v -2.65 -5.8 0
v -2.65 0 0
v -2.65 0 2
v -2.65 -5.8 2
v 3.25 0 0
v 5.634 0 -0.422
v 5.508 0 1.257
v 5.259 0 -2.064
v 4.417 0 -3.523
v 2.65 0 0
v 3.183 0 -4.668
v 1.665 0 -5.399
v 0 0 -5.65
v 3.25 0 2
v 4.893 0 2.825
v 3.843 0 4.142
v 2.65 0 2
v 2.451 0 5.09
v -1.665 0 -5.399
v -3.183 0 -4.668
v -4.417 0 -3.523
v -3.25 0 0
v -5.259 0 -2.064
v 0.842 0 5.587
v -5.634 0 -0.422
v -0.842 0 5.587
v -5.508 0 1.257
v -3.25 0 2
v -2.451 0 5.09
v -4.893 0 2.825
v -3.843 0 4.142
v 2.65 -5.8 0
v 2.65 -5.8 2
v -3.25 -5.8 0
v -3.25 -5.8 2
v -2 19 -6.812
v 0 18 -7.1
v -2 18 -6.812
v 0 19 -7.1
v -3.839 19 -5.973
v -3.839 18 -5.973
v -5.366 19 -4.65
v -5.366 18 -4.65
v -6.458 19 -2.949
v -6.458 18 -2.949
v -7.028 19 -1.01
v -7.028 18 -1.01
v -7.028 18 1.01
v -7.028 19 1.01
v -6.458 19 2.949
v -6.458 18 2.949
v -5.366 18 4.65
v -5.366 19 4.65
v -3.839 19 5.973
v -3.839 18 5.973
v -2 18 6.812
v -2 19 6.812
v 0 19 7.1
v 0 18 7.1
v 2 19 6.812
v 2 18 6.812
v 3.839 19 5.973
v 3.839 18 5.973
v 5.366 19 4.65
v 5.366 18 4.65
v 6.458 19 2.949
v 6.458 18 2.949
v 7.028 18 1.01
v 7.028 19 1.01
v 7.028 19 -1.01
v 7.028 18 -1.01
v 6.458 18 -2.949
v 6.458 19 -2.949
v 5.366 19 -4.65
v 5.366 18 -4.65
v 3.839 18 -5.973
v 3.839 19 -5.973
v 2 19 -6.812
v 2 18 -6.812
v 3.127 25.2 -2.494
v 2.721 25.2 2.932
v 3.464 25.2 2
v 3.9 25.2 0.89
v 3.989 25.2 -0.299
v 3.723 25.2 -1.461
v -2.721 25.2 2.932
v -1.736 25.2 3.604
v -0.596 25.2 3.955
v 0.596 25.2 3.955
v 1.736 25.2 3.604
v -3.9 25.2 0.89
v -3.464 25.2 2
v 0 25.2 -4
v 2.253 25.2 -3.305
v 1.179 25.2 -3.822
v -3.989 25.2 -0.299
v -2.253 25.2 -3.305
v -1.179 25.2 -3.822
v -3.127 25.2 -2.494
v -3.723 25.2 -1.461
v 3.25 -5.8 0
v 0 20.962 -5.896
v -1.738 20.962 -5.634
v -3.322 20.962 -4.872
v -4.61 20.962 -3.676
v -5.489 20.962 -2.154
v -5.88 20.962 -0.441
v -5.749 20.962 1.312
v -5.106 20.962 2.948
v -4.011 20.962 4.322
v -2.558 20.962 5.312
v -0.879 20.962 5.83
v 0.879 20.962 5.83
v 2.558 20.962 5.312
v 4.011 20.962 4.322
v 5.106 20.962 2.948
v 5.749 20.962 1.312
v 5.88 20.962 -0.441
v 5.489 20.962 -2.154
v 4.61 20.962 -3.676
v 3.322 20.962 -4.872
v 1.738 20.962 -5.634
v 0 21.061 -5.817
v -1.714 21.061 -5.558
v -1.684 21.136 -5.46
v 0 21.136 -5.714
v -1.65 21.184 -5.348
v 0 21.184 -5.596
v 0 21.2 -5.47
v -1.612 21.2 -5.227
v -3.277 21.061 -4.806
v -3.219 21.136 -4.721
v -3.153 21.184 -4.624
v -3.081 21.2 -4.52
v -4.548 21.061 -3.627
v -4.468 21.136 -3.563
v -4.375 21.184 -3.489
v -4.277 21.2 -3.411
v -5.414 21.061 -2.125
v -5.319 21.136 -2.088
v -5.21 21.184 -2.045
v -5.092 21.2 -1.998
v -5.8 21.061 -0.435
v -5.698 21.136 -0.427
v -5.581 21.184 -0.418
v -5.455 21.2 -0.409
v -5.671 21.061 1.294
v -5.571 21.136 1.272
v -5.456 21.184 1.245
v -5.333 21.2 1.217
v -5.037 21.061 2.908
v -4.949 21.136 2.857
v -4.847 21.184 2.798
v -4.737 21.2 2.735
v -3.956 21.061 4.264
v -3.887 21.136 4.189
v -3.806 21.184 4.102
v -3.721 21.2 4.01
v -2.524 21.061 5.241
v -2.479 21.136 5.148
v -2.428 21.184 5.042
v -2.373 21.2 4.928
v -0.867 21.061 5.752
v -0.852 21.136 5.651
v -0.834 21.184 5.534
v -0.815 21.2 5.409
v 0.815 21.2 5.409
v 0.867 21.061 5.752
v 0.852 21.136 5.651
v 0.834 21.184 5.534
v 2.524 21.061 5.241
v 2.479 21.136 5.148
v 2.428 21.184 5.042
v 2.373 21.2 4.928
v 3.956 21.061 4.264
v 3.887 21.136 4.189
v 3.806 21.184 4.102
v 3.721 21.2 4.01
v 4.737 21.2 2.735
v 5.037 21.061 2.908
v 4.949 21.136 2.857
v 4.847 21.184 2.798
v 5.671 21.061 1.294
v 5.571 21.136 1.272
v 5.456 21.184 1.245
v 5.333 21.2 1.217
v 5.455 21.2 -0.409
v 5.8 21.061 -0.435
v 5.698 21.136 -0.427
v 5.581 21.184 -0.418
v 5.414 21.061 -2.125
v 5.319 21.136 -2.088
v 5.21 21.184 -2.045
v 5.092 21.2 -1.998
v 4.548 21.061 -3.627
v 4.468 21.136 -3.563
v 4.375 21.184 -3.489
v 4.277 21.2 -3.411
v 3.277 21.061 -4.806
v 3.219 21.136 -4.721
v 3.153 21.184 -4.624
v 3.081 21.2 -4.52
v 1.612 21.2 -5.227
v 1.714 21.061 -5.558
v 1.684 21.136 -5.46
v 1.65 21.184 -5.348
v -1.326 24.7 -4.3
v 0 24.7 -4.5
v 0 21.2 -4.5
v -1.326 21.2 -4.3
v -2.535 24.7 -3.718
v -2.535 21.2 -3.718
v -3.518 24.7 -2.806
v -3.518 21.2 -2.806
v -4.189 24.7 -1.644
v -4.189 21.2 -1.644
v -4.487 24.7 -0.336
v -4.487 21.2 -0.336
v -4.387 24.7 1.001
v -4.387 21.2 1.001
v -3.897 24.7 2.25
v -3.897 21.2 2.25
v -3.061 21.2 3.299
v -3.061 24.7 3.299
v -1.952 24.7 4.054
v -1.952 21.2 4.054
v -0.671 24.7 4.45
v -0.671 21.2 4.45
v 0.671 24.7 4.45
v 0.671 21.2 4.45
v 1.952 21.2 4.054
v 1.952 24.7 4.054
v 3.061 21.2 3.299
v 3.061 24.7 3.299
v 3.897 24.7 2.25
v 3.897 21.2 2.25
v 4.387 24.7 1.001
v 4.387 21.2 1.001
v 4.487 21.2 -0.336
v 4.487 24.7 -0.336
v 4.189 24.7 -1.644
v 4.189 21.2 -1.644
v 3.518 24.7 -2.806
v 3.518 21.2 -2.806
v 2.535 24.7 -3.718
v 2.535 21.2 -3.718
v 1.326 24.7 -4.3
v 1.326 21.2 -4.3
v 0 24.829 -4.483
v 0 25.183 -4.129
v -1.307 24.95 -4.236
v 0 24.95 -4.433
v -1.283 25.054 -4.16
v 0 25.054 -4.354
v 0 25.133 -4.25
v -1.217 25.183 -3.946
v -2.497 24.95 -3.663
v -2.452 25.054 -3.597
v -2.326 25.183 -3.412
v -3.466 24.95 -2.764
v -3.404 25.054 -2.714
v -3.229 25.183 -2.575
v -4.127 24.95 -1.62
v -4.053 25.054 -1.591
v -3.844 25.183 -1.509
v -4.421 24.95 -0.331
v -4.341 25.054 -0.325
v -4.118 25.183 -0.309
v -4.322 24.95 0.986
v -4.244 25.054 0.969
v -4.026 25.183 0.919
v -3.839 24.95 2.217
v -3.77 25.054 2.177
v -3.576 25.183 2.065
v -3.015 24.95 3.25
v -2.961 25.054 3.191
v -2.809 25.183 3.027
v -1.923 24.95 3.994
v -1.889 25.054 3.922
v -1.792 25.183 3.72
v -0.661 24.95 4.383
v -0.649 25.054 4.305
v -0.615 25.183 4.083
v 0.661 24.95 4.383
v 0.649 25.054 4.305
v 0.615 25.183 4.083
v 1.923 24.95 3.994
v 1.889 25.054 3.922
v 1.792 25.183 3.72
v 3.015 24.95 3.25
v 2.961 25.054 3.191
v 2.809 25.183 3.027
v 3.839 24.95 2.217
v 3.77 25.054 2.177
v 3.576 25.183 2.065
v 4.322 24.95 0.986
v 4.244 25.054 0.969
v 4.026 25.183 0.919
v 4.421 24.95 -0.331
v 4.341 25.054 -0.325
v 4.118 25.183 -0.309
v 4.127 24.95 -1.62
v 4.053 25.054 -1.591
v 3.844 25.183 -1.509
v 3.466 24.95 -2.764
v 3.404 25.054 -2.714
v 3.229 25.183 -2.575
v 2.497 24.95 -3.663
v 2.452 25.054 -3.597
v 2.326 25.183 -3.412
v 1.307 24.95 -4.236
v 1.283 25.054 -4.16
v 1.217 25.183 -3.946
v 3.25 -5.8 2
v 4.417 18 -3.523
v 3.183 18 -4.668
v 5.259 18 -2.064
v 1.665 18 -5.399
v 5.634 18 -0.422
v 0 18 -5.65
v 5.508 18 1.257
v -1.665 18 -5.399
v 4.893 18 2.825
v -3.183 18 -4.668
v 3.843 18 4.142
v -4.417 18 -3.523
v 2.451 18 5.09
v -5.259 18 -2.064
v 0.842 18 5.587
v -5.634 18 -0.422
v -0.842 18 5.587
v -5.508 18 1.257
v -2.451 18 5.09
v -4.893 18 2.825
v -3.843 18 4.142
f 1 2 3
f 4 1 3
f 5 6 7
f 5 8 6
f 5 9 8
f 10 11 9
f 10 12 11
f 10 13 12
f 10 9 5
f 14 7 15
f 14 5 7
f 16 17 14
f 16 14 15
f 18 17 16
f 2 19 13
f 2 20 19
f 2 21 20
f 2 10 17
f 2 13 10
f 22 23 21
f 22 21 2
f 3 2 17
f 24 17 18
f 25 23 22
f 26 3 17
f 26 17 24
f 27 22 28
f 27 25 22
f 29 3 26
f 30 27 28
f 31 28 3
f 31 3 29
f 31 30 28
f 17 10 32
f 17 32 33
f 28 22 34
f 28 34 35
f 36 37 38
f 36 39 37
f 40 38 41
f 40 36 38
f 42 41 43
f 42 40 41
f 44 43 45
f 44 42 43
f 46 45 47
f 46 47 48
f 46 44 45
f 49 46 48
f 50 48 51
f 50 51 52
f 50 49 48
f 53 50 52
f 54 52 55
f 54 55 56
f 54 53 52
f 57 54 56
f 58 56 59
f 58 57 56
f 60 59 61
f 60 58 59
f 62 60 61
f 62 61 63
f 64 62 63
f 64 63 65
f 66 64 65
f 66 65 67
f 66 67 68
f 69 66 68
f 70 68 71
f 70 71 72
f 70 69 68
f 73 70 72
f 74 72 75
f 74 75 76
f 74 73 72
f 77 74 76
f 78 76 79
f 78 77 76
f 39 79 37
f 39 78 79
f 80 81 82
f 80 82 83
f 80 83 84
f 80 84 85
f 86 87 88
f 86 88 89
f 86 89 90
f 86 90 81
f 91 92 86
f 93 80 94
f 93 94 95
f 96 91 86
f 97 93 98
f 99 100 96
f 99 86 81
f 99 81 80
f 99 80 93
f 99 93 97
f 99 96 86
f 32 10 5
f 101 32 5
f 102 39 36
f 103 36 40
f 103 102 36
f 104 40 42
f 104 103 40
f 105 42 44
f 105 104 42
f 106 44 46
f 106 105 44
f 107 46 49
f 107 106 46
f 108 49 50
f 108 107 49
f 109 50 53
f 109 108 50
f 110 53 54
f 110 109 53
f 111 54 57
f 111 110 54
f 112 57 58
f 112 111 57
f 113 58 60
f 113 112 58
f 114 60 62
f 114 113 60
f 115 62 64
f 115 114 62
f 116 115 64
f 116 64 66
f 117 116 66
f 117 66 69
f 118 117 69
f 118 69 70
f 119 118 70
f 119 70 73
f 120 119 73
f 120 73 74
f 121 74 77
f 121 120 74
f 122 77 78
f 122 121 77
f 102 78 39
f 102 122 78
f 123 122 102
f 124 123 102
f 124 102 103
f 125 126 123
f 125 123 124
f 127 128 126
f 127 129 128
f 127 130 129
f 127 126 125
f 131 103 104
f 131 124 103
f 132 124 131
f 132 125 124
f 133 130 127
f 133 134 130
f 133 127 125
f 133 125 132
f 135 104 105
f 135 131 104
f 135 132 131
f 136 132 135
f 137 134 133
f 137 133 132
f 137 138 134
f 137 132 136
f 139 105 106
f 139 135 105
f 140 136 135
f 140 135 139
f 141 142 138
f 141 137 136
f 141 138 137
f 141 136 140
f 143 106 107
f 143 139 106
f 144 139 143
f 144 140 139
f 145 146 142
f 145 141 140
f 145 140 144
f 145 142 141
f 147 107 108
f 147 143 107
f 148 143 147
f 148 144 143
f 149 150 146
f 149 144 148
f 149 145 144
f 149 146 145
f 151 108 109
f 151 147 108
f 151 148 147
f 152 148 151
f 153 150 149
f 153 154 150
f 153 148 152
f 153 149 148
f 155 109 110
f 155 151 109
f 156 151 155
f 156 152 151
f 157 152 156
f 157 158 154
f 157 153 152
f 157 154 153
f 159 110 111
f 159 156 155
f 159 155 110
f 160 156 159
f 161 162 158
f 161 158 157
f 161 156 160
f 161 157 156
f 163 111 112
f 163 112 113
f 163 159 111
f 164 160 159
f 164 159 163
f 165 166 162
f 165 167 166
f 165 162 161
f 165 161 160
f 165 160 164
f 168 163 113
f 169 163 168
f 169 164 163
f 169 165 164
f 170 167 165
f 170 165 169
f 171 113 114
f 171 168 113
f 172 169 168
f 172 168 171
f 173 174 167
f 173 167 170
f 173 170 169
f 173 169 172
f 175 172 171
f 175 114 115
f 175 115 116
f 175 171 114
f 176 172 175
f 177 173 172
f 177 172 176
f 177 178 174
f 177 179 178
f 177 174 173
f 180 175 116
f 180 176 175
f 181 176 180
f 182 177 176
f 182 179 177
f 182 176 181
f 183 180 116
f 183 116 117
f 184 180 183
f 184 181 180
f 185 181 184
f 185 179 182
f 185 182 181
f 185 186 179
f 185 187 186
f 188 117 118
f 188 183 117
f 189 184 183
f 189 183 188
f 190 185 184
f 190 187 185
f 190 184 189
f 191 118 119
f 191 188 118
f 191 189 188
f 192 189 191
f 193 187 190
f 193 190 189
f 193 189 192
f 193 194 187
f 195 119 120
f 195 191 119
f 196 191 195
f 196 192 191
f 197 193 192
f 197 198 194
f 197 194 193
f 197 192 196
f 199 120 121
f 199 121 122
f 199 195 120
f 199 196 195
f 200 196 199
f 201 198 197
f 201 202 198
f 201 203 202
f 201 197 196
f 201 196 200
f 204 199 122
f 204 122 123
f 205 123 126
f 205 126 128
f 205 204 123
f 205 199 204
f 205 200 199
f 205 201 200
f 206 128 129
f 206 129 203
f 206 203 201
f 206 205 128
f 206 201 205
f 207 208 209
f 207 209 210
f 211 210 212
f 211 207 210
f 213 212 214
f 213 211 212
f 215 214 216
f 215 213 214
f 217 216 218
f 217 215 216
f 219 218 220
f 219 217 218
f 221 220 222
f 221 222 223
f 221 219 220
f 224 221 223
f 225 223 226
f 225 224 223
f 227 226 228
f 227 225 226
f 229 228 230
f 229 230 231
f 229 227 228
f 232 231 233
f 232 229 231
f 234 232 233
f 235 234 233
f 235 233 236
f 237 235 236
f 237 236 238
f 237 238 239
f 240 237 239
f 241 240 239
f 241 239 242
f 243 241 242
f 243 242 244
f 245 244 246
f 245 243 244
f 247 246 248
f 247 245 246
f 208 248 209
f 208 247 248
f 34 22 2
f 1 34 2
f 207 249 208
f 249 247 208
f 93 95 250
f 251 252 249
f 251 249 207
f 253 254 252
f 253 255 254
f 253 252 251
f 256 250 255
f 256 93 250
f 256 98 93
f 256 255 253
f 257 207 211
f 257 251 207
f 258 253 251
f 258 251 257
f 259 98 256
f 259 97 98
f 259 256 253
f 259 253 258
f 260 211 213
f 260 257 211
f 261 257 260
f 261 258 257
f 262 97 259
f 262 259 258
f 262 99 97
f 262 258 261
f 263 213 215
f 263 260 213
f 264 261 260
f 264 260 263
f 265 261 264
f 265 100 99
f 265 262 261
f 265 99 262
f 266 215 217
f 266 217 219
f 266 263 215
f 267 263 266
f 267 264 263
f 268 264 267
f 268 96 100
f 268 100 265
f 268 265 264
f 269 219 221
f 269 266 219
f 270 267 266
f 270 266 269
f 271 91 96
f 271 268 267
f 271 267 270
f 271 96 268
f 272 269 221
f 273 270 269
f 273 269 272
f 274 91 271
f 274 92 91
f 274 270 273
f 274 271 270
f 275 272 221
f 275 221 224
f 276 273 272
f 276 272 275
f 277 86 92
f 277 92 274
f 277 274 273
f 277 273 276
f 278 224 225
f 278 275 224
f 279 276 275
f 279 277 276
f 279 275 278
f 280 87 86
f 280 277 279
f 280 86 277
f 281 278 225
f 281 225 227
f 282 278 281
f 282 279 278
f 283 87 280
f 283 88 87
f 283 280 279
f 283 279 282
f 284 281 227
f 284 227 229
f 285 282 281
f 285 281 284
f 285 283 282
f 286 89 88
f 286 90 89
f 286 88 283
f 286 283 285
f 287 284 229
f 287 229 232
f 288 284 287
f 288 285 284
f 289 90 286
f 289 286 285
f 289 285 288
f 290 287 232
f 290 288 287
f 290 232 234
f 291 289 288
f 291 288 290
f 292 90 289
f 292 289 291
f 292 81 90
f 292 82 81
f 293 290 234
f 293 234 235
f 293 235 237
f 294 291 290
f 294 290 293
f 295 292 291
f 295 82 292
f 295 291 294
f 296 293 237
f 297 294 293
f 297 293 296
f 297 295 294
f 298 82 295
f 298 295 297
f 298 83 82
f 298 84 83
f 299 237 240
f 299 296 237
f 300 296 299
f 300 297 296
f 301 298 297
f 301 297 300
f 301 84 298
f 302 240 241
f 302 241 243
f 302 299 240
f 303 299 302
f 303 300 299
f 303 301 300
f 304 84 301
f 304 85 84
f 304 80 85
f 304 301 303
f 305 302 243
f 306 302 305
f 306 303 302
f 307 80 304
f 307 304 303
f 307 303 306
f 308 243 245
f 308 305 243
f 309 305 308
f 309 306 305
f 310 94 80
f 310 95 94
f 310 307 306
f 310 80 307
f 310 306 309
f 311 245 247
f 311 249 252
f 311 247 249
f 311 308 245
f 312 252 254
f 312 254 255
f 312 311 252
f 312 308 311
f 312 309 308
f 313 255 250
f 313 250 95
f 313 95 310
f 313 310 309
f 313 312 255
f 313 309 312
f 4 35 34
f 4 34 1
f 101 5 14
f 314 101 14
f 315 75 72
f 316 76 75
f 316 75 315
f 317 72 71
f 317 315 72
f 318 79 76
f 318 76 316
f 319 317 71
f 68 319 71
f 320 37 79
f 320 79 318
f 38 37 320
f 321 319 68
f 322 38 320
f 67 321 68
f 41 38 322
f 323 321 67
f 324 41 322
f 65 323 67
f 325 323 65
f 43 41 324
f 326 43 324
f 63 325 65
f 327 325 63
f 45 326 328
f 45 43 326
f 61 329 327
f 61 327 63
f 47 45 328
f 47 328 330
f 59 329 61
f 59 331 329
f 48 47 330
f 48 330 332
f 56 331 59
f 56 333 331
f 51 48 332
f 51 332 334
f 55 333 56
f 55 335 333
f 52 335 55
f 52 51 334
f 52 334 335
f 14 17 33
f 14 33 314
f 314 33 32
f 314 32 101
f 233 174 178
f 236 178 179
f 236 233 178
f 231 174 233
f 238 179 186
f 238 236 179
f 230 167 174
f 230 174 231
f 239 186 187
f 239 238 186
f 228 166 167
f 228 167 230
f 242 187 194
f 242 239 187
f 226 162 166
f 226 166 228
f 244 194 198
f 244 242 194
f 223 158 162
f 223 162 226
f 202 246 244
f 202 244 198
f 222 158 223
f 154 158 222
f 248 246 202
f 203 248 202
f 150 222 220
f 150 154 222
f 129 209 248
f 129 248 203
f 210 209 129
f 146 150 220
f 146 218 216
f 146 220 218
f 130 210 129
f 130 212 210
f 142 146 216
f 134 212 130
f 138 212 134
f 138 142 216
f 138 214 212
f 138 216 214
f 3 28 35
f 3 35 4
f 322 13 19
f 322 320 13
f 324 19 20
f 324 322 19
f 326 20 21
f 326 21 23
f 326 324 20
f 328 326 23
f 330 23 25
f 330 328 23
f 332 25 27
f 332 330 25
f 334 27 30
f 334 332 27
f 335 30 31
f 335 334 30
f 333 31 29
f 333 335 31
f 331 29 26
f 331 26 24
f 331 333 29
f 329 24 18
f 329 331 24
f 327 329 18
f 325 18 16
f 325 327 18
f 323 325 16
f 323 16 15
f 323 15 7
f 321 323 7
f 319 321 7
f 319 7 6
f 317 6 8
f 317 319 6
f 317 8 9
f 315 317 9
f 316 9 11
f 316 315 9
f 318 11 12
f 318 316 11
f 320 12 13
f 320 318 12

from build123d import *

# Parameters (mm, degrees)
FILLET1_R           = 0.5
SKETCH2_W           = 0.6
SKETCH2_H           = 2
BOSS_EXTRUDE1_DEPTH = 5.8


with BuildPart() as part:
    # Sketch1 → Revolve1 (revolve)
    with BuildSketch(Plane.XY, mode=Mode.PRIVATE) as revolve1_sk:
        Polygon((0, 0), (-5.65, 0), (-5.65, 18), (-7.1, 18), (-7.1, 19), (-5.75, 21.2), (-4.5, 21.2), (-4.5, 25.2), (0, 25.2), align=None)
    revolve(revolve1_sk.sketch.rotate(Axis((0, 0, 0), (0, 1, 0)), 270), axis=Axis((0, 0, 0), (0, 1, 0)))

    # Fillet1
    fillet1_edges = [part.edges().sort_by_distance(p)[0] for p in [
        (0, 25.2, 4.5),
        (0, 21.2, 5.75),
    ]]
    fillet(fillet1_edges, radius=FILLET1_R)

    # Sketch2 → Boss-Extrude1 (add)
    with BuildSketch(Plane.XZ):
        with Locations((-2.95, 1)):
            Rectangle(SKETCH2_W, SKETCH2_H)
        with Locations((2.95, 1)):
            Rectangle(SKETCH2_W, SKETCH2_H)
    extrude(amount=BOSS_EXTRUDE1_DEPTH)


solid = part.part
